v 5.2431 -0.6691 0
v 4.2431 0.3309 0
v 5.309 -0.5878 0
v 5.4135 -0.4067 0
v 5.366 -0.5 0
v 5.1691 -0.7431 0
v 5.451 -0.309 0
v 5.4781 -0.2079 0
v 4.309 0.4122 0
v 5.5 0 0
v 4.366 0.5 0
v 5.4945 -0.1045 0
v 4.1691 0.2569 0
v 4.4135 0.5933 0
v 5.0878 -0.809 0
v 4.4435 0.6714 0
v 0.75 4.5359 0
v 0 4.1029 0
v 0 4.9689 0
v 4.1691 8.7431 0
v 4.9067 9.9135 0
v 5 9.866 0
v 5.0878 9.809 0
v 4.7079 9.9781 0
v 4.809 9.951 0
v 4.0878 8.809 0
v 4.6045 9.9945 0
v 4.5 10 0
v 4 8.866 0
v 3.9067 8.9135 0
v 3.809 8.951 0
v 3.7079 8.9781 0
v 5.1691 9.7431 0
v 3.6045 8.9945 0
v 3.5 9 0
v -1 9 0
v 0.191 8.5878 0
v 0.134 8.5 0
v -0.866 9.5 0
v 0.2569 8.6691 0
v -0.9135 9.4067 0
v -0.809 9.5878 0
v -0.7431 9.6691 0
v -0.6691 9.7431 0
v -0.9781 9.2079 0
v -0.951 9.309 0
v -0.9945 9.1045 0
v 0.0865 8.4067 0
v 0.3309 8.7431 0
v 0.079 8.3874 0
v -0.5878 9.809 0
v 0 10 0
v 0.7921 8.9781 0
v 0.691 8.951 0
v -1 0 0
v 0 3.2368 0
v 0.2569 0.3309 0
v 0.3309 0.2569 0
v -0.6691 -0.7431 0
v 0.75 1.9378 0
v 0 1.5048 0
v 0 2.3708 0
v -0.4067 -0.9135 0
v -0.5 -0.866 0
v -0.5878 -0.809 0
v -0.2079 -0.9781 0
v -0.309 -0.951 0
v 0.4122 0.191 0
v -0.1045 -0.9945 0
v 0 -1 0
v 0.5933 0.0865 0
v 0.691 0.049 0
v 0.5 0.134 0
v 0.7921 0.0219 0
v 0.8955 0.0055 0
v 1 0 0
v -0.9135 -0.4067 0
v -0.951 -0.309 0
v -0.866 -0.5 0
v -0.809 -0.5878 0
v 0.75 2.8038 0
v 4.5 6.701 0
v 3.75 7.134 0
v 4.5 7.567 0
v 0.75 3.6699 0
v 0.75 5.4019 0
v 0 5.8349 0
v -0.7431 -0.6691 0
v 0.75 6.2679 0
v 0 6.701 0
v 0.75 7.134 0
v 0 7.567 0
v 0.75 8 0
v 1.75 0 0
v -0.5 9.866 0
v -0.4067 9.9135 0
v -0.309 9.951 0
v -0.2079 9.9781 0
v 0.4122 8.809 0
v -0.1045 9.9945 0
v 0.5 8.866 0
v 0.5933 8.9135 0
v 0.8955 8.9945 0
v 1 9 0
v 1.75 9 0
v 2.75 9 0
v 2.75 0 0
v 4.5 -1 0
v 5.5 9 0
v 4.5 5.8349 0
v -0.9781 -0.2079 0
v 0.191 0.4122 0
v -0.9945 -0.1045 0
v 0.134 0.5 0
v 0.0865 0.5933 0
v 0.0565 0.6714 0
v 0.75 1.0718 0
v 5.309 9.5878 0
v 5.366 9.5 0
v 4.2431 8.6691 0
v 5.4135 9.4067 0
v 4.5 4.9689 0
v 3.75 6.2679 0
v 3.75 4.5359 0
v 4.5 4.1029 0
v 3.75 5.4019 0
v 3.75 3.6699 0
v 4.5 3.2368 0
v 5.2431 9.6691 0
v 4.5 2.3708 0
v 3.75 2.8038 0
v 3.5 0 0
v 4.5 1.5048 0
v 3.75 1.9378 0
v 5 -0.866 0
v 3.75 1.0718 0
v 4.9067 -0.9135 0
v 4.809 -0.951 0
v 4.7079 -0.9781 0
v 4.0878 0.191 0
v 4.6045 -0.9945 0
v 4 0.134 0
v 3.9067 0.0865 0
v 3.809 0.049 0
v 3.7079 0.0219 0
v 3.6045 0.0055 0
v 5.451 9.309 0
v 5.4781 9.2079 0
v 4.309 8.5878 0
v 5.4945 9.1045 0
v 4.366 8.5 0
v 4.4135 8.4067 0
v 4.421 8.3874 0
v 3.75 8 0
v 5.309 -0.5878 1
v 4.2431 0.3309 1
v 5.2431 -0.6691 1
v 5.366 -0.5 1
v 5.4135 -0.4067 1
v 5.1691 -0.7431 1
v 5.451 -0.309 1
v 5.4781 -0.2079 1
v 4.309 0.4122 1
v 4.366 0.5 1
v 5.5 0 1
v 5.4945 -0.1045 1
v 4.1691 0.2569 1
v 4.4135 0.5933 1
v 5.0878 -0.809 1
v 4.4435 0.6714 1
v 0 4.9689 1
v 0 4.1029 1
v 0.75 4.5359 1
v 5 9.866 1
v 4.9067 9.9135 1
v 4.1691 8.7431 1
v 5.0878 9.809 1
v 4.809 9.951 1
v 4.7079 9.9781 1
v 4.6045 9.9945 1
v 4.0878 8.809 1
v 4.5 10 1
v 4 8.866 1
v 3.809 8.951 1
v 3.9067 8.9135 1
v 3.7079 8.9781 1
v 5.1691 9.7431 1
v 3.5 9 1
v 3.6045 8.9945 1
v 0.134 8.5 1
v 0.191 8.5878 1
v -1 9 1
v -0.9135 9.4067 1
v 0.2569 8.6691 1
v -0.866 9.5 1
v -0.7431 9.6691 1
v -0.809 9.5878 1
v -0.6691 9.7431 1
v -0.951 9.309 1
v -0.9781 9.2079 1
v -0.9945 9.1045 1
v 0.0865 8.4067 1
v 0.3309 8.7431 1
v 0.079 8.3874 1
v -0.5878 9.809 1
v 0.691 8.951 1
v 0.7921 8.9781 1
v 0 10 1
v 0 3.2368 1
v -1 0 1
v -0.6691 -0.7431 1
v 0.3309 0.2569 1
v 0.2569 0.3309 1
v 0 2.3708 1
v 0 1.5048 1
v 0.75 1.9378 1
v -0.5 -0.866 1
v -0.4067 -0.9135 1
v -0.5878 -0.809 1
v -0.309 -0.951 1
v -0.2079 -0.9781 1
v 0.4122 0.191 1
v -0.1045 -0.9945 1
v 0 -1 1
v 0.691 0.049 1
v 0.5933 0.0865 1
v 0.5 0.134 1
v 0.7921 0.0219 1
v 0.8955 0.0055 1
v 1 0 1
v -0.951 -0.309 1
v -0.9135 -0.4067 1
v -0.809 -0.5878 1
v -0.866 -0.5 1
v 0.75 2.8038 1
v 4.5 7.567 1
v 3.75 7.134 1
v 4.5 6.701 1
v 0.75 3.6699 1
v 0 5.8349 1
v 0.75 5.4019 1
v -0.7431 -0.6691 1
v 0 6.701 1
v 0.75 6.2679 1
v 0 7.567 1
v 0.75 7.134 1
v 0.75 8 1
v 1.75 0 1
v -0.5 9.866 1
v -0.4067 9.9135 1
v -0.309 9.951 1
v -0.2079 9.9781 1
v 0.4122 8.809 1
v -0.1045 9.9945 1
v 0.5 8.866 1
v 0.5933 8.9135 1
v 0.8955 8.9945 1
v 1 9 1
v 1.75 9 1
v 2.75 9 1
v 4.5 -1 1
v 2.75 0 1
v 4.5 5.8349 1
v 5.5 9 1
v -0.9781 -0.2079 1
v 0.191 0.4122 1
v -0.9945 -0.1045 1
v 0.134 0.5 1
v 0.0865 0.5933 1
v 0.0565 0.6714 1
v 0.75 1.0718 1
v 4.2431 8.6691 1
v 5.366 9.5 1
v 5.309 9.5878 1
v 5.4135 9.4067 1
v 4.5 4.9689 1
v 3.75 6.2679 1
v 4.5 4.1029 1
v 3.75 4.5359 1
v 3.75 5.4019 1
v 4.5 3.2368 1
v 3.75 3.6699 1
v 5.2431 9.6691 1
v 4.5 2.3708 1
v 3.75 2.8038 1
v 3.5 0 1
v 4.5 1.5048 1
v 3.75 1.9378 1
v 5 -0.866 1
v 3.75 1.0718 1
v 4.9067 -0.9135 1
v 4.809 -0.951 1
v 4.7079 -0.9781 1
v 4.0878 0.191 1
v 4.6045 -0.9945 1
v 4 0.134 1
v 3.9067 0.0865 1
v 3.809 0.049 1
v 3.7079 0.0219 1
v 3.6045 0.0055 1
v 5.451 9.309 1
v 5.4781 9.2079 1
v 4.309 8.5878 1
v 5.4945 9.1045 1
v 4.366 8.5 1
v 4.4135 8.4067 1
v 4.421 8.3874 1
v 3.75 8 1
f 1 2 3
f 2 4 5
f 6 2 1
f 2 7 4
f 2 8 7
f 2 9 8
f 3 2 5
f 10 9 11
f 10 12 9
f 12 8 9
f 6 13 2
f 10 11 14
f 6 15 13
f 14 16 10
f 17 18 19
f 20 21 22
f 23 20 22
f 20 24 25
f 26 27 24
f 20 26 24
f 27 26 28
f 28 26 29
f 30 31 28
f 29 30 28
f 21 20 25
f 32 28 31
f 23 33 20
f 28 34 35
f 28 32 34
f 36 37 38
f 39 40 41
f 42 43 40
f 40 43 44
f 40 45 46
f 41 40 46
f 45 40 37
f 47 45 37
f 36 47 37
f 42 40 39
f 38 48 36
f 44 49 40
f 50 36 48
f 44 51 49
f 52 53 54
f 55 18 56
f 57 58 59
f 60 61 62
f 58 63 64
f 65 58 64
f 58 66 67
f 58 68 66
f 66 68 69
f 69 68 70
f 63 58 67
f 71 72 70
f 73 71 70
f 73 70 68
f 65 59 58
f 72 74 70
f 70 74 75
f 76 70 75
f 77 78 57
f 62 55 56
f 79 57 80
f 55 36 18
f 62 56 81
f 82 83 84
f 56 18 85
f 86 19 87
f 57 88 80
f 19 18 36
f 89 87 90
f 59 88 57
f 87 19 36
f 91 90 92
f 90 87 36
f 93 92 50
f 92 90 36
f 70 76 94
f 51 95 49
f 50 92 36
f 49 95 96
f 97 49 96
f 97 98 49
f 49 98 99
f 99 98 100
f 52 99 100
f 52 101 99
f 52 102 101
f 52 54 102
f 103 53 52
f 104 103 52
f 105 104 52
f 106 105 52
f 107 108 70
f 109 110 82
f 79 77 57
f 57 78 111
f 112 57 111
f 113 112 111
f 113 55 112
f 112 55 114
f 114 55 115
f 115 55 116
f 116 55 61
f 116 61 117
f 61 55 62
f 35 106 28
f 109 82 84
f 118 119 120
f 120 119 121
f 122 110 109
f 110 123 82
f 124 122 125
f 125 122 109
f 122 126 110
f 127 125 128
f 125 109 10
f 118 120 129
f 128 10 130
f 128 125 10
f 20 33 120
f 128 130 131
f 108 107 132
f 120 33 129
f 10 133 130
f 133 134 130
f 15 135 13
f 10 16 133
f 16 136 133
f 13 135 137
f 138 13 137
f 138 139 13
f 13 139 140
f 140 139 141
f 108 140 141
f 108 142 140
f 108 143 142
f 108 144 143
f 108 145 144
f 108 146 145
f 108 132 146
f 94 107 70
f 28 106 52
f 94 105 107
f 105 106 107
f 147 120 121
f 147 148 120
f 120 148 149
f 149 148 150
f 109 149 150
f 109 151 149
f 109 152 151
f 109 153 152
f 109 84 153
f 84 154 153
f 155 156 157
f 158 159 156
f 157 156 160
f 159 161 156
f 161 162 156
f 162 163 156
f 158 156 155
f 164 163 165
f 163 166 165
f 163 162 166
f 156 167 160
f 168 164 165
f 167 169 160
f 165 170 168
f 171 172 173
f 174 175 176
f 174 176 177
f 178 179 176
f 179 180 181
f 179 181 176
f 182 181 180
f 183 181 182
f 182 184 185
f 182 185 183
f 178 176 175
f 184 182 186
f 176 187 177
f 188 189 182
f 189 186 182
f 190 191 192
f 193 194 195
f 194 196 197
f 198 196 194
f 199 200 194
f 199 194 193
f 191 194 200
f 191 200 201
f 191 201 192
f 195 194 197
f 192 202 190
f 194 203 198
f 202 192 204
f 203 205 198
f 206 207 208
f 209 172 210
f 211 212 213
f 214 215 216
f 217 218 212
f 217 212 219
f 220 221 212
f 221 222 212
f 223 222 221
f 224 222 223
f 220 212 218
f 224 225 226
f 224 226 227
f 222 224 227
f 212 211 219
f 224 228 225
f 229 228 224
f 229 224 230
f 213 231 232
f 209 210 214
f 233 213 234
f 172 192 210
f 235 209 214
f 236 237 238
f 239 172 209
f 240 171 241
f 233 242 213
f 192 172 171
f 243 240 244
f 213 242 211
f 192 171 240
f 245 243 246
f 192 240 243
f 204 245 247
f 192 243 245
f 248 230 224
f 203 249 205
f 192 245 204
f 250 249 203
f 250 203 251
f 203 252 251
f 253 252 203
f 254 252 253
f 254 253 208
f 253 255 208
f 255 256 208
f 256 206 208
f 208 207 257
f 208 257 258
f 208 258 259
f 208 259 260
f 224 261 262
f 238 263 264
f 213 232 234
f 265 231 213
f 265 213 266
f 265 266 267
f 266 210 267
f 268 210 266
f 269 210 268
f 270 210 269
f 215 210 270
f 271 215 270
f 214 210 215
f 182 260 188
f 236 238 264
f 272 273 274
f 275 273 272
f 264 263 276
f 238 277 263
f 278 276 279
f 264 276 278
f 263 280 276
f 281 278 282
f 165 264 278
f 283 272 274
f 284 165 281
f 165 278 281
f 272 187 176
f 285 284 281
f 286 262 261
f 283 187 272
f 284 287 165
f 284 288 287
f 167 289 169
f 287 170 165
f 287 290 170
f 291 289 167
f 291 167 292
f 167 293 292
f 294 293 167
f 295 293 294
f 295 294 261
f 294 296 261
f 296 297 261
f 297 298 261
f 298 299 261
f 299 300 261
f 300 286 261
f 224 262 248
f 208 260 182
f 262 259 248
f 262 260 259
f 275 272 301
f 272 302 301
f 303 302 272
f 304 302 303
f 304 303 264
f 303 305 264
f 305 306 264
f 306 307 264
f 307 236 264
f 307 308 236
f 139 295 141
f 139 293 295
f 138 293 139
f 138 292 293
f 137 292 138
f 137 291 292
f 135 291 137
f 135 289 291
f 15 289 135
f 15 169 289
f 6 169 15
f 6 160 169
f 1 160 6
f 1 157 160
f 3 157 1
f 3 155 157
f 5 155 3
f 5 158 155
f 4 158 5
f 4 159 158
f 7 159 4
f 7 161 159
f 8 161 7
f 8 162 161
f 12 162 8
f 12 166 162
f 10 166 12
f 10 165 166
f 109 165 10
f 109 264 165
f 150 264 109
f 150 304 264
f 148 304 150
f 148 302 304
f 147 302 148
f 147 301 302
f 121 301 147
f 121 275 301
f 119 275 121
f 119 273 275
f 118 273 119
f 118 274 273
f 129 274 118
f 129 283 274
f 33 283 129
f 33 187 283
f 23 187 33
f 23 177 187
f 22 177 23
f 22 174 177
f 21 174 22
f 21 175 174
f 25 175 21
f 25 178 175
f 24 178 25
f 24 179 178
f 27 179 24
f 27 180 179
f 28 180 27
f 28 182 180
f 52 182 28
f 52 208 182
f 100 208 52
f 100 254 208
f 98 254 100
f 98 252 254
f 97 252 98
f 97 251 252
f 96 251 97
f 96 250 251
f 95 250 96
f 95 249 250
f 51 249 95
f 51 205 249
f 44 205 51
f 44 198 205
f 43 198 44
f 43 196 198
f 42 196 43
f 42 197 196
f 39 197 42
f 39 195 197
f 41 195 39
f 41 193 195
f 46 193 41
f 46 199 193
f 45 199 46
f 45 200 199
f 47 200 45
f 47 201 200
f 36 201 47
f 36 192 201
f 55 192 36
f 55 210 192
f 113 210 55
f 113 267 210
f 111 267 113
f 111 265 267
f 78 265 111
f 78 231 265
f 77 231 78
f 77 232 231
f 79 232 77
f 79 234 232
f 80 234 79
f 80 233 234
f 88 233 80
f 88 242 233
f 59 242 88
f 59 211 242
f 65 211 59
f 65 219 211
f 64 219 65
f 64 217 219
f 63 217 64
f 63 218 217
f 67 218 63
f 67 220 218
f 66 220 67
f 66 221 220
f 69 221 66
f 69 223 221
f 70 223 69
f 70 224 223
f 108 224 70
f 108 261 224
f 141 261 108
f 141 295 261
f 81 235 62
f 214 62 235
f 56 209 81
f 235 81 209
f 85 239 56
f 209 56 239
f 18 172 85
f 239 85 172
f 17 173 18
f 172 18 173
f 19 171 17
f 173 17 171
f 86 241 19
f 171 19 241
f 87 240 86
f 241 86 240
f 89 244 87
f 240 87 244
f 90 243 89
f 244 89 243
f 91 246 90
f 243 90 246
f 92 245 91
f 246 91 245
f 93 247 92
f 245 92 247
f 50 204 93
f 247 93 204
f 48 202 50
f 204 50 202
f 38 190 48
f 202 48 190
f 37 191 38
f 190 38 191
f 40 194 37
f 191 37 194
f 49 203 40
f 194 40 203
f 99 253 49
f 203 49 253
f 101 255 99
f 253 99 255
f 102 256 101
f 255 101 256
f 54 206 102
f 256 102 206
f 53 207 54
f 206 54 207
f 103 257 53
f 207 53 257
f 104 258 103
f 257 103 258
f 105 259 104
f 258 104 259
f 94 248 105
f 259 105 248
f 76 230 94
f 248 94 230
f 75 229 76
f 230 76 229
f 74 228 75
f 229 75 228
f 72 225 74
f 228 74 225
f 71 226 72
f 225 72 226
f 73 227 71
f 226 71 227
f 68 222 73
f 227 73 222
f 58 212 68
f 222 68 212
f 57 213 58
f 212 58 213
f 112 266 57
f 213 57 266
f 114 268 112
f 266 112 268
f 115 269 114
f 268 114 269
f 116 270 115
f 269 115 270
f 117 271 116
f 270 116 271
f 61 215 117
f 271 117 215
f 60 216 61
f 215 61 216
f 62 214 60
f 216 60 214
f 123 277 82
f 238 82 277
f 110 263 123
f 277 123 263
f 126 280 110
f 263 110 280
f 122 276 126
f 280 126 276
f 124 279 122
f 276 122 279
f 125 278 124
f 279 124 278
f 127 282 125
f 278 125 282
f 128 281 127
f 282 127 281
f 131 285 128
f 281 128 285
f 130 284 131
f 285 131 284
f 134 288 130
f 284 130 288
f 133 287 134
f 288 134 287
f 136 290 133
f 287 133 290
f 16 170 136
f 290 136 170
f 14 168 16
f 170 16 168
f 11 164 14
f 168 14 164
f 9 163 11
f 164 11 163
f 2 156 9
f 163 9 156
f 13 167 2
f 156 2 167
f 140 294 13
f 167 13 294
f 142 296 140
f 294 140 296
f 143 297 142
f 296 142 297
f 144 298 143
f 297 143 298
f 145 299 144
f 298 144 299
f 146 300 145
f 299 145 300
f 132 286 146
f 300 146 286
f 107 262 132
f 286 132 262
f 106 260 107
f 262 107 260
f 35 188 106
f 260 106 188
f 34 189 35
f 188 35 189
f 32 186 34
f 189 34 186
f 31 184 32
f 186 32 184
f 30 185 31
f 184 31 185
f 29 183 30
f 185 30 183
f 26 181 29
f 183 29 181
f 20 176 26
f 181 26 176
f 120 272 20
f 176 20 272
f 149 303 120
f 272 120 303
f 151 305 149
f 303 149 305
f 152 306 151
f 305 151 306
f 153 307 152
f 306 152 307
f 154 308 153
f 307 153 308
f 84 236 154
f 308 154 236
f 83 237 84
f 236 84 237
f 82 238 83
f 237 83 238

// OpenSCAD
$fn=60;


height = 9;
width = height / 2;
round_r = 1;
spike_r = .5;
buckle_thickness=1;

module arrange(x,y) {
    translate([0,0,0]) children();
    translate([x,0,0]) children();
    translate([0,y,0]) children();
    translate([x,y,0]) children();
}

module rect(x,y,round_r) {
    hull() {
        arrange(x,y) circle(r=round_r);
    }
}

module base() {
    difference() {
        rect(width, height, round_r);
        translate([buckle_thickness, buckle_thickness, 0])
          rect(width-buckle_thickness*2, height-buckle_thickness*2, round_r);
    }
}

module center() {
    translate([width/2 - buckle_thickness/2,0,0])
    square(size=[buckle_thickness, height]);
}

module spikes() {
    inc = 2*spike_r*sin(60);
    for (y = [height - round_r : -inc : round_r]) {
        translate([spike_r/2,y,0])
            circle(r=spike_r, $fn=3);
    }
}

linear_extrude(height=buckle_thickness) {
    base();
    center();
    spikes();
    translate([width,0,0]) mirror([1,0,0]) spikes();
}
